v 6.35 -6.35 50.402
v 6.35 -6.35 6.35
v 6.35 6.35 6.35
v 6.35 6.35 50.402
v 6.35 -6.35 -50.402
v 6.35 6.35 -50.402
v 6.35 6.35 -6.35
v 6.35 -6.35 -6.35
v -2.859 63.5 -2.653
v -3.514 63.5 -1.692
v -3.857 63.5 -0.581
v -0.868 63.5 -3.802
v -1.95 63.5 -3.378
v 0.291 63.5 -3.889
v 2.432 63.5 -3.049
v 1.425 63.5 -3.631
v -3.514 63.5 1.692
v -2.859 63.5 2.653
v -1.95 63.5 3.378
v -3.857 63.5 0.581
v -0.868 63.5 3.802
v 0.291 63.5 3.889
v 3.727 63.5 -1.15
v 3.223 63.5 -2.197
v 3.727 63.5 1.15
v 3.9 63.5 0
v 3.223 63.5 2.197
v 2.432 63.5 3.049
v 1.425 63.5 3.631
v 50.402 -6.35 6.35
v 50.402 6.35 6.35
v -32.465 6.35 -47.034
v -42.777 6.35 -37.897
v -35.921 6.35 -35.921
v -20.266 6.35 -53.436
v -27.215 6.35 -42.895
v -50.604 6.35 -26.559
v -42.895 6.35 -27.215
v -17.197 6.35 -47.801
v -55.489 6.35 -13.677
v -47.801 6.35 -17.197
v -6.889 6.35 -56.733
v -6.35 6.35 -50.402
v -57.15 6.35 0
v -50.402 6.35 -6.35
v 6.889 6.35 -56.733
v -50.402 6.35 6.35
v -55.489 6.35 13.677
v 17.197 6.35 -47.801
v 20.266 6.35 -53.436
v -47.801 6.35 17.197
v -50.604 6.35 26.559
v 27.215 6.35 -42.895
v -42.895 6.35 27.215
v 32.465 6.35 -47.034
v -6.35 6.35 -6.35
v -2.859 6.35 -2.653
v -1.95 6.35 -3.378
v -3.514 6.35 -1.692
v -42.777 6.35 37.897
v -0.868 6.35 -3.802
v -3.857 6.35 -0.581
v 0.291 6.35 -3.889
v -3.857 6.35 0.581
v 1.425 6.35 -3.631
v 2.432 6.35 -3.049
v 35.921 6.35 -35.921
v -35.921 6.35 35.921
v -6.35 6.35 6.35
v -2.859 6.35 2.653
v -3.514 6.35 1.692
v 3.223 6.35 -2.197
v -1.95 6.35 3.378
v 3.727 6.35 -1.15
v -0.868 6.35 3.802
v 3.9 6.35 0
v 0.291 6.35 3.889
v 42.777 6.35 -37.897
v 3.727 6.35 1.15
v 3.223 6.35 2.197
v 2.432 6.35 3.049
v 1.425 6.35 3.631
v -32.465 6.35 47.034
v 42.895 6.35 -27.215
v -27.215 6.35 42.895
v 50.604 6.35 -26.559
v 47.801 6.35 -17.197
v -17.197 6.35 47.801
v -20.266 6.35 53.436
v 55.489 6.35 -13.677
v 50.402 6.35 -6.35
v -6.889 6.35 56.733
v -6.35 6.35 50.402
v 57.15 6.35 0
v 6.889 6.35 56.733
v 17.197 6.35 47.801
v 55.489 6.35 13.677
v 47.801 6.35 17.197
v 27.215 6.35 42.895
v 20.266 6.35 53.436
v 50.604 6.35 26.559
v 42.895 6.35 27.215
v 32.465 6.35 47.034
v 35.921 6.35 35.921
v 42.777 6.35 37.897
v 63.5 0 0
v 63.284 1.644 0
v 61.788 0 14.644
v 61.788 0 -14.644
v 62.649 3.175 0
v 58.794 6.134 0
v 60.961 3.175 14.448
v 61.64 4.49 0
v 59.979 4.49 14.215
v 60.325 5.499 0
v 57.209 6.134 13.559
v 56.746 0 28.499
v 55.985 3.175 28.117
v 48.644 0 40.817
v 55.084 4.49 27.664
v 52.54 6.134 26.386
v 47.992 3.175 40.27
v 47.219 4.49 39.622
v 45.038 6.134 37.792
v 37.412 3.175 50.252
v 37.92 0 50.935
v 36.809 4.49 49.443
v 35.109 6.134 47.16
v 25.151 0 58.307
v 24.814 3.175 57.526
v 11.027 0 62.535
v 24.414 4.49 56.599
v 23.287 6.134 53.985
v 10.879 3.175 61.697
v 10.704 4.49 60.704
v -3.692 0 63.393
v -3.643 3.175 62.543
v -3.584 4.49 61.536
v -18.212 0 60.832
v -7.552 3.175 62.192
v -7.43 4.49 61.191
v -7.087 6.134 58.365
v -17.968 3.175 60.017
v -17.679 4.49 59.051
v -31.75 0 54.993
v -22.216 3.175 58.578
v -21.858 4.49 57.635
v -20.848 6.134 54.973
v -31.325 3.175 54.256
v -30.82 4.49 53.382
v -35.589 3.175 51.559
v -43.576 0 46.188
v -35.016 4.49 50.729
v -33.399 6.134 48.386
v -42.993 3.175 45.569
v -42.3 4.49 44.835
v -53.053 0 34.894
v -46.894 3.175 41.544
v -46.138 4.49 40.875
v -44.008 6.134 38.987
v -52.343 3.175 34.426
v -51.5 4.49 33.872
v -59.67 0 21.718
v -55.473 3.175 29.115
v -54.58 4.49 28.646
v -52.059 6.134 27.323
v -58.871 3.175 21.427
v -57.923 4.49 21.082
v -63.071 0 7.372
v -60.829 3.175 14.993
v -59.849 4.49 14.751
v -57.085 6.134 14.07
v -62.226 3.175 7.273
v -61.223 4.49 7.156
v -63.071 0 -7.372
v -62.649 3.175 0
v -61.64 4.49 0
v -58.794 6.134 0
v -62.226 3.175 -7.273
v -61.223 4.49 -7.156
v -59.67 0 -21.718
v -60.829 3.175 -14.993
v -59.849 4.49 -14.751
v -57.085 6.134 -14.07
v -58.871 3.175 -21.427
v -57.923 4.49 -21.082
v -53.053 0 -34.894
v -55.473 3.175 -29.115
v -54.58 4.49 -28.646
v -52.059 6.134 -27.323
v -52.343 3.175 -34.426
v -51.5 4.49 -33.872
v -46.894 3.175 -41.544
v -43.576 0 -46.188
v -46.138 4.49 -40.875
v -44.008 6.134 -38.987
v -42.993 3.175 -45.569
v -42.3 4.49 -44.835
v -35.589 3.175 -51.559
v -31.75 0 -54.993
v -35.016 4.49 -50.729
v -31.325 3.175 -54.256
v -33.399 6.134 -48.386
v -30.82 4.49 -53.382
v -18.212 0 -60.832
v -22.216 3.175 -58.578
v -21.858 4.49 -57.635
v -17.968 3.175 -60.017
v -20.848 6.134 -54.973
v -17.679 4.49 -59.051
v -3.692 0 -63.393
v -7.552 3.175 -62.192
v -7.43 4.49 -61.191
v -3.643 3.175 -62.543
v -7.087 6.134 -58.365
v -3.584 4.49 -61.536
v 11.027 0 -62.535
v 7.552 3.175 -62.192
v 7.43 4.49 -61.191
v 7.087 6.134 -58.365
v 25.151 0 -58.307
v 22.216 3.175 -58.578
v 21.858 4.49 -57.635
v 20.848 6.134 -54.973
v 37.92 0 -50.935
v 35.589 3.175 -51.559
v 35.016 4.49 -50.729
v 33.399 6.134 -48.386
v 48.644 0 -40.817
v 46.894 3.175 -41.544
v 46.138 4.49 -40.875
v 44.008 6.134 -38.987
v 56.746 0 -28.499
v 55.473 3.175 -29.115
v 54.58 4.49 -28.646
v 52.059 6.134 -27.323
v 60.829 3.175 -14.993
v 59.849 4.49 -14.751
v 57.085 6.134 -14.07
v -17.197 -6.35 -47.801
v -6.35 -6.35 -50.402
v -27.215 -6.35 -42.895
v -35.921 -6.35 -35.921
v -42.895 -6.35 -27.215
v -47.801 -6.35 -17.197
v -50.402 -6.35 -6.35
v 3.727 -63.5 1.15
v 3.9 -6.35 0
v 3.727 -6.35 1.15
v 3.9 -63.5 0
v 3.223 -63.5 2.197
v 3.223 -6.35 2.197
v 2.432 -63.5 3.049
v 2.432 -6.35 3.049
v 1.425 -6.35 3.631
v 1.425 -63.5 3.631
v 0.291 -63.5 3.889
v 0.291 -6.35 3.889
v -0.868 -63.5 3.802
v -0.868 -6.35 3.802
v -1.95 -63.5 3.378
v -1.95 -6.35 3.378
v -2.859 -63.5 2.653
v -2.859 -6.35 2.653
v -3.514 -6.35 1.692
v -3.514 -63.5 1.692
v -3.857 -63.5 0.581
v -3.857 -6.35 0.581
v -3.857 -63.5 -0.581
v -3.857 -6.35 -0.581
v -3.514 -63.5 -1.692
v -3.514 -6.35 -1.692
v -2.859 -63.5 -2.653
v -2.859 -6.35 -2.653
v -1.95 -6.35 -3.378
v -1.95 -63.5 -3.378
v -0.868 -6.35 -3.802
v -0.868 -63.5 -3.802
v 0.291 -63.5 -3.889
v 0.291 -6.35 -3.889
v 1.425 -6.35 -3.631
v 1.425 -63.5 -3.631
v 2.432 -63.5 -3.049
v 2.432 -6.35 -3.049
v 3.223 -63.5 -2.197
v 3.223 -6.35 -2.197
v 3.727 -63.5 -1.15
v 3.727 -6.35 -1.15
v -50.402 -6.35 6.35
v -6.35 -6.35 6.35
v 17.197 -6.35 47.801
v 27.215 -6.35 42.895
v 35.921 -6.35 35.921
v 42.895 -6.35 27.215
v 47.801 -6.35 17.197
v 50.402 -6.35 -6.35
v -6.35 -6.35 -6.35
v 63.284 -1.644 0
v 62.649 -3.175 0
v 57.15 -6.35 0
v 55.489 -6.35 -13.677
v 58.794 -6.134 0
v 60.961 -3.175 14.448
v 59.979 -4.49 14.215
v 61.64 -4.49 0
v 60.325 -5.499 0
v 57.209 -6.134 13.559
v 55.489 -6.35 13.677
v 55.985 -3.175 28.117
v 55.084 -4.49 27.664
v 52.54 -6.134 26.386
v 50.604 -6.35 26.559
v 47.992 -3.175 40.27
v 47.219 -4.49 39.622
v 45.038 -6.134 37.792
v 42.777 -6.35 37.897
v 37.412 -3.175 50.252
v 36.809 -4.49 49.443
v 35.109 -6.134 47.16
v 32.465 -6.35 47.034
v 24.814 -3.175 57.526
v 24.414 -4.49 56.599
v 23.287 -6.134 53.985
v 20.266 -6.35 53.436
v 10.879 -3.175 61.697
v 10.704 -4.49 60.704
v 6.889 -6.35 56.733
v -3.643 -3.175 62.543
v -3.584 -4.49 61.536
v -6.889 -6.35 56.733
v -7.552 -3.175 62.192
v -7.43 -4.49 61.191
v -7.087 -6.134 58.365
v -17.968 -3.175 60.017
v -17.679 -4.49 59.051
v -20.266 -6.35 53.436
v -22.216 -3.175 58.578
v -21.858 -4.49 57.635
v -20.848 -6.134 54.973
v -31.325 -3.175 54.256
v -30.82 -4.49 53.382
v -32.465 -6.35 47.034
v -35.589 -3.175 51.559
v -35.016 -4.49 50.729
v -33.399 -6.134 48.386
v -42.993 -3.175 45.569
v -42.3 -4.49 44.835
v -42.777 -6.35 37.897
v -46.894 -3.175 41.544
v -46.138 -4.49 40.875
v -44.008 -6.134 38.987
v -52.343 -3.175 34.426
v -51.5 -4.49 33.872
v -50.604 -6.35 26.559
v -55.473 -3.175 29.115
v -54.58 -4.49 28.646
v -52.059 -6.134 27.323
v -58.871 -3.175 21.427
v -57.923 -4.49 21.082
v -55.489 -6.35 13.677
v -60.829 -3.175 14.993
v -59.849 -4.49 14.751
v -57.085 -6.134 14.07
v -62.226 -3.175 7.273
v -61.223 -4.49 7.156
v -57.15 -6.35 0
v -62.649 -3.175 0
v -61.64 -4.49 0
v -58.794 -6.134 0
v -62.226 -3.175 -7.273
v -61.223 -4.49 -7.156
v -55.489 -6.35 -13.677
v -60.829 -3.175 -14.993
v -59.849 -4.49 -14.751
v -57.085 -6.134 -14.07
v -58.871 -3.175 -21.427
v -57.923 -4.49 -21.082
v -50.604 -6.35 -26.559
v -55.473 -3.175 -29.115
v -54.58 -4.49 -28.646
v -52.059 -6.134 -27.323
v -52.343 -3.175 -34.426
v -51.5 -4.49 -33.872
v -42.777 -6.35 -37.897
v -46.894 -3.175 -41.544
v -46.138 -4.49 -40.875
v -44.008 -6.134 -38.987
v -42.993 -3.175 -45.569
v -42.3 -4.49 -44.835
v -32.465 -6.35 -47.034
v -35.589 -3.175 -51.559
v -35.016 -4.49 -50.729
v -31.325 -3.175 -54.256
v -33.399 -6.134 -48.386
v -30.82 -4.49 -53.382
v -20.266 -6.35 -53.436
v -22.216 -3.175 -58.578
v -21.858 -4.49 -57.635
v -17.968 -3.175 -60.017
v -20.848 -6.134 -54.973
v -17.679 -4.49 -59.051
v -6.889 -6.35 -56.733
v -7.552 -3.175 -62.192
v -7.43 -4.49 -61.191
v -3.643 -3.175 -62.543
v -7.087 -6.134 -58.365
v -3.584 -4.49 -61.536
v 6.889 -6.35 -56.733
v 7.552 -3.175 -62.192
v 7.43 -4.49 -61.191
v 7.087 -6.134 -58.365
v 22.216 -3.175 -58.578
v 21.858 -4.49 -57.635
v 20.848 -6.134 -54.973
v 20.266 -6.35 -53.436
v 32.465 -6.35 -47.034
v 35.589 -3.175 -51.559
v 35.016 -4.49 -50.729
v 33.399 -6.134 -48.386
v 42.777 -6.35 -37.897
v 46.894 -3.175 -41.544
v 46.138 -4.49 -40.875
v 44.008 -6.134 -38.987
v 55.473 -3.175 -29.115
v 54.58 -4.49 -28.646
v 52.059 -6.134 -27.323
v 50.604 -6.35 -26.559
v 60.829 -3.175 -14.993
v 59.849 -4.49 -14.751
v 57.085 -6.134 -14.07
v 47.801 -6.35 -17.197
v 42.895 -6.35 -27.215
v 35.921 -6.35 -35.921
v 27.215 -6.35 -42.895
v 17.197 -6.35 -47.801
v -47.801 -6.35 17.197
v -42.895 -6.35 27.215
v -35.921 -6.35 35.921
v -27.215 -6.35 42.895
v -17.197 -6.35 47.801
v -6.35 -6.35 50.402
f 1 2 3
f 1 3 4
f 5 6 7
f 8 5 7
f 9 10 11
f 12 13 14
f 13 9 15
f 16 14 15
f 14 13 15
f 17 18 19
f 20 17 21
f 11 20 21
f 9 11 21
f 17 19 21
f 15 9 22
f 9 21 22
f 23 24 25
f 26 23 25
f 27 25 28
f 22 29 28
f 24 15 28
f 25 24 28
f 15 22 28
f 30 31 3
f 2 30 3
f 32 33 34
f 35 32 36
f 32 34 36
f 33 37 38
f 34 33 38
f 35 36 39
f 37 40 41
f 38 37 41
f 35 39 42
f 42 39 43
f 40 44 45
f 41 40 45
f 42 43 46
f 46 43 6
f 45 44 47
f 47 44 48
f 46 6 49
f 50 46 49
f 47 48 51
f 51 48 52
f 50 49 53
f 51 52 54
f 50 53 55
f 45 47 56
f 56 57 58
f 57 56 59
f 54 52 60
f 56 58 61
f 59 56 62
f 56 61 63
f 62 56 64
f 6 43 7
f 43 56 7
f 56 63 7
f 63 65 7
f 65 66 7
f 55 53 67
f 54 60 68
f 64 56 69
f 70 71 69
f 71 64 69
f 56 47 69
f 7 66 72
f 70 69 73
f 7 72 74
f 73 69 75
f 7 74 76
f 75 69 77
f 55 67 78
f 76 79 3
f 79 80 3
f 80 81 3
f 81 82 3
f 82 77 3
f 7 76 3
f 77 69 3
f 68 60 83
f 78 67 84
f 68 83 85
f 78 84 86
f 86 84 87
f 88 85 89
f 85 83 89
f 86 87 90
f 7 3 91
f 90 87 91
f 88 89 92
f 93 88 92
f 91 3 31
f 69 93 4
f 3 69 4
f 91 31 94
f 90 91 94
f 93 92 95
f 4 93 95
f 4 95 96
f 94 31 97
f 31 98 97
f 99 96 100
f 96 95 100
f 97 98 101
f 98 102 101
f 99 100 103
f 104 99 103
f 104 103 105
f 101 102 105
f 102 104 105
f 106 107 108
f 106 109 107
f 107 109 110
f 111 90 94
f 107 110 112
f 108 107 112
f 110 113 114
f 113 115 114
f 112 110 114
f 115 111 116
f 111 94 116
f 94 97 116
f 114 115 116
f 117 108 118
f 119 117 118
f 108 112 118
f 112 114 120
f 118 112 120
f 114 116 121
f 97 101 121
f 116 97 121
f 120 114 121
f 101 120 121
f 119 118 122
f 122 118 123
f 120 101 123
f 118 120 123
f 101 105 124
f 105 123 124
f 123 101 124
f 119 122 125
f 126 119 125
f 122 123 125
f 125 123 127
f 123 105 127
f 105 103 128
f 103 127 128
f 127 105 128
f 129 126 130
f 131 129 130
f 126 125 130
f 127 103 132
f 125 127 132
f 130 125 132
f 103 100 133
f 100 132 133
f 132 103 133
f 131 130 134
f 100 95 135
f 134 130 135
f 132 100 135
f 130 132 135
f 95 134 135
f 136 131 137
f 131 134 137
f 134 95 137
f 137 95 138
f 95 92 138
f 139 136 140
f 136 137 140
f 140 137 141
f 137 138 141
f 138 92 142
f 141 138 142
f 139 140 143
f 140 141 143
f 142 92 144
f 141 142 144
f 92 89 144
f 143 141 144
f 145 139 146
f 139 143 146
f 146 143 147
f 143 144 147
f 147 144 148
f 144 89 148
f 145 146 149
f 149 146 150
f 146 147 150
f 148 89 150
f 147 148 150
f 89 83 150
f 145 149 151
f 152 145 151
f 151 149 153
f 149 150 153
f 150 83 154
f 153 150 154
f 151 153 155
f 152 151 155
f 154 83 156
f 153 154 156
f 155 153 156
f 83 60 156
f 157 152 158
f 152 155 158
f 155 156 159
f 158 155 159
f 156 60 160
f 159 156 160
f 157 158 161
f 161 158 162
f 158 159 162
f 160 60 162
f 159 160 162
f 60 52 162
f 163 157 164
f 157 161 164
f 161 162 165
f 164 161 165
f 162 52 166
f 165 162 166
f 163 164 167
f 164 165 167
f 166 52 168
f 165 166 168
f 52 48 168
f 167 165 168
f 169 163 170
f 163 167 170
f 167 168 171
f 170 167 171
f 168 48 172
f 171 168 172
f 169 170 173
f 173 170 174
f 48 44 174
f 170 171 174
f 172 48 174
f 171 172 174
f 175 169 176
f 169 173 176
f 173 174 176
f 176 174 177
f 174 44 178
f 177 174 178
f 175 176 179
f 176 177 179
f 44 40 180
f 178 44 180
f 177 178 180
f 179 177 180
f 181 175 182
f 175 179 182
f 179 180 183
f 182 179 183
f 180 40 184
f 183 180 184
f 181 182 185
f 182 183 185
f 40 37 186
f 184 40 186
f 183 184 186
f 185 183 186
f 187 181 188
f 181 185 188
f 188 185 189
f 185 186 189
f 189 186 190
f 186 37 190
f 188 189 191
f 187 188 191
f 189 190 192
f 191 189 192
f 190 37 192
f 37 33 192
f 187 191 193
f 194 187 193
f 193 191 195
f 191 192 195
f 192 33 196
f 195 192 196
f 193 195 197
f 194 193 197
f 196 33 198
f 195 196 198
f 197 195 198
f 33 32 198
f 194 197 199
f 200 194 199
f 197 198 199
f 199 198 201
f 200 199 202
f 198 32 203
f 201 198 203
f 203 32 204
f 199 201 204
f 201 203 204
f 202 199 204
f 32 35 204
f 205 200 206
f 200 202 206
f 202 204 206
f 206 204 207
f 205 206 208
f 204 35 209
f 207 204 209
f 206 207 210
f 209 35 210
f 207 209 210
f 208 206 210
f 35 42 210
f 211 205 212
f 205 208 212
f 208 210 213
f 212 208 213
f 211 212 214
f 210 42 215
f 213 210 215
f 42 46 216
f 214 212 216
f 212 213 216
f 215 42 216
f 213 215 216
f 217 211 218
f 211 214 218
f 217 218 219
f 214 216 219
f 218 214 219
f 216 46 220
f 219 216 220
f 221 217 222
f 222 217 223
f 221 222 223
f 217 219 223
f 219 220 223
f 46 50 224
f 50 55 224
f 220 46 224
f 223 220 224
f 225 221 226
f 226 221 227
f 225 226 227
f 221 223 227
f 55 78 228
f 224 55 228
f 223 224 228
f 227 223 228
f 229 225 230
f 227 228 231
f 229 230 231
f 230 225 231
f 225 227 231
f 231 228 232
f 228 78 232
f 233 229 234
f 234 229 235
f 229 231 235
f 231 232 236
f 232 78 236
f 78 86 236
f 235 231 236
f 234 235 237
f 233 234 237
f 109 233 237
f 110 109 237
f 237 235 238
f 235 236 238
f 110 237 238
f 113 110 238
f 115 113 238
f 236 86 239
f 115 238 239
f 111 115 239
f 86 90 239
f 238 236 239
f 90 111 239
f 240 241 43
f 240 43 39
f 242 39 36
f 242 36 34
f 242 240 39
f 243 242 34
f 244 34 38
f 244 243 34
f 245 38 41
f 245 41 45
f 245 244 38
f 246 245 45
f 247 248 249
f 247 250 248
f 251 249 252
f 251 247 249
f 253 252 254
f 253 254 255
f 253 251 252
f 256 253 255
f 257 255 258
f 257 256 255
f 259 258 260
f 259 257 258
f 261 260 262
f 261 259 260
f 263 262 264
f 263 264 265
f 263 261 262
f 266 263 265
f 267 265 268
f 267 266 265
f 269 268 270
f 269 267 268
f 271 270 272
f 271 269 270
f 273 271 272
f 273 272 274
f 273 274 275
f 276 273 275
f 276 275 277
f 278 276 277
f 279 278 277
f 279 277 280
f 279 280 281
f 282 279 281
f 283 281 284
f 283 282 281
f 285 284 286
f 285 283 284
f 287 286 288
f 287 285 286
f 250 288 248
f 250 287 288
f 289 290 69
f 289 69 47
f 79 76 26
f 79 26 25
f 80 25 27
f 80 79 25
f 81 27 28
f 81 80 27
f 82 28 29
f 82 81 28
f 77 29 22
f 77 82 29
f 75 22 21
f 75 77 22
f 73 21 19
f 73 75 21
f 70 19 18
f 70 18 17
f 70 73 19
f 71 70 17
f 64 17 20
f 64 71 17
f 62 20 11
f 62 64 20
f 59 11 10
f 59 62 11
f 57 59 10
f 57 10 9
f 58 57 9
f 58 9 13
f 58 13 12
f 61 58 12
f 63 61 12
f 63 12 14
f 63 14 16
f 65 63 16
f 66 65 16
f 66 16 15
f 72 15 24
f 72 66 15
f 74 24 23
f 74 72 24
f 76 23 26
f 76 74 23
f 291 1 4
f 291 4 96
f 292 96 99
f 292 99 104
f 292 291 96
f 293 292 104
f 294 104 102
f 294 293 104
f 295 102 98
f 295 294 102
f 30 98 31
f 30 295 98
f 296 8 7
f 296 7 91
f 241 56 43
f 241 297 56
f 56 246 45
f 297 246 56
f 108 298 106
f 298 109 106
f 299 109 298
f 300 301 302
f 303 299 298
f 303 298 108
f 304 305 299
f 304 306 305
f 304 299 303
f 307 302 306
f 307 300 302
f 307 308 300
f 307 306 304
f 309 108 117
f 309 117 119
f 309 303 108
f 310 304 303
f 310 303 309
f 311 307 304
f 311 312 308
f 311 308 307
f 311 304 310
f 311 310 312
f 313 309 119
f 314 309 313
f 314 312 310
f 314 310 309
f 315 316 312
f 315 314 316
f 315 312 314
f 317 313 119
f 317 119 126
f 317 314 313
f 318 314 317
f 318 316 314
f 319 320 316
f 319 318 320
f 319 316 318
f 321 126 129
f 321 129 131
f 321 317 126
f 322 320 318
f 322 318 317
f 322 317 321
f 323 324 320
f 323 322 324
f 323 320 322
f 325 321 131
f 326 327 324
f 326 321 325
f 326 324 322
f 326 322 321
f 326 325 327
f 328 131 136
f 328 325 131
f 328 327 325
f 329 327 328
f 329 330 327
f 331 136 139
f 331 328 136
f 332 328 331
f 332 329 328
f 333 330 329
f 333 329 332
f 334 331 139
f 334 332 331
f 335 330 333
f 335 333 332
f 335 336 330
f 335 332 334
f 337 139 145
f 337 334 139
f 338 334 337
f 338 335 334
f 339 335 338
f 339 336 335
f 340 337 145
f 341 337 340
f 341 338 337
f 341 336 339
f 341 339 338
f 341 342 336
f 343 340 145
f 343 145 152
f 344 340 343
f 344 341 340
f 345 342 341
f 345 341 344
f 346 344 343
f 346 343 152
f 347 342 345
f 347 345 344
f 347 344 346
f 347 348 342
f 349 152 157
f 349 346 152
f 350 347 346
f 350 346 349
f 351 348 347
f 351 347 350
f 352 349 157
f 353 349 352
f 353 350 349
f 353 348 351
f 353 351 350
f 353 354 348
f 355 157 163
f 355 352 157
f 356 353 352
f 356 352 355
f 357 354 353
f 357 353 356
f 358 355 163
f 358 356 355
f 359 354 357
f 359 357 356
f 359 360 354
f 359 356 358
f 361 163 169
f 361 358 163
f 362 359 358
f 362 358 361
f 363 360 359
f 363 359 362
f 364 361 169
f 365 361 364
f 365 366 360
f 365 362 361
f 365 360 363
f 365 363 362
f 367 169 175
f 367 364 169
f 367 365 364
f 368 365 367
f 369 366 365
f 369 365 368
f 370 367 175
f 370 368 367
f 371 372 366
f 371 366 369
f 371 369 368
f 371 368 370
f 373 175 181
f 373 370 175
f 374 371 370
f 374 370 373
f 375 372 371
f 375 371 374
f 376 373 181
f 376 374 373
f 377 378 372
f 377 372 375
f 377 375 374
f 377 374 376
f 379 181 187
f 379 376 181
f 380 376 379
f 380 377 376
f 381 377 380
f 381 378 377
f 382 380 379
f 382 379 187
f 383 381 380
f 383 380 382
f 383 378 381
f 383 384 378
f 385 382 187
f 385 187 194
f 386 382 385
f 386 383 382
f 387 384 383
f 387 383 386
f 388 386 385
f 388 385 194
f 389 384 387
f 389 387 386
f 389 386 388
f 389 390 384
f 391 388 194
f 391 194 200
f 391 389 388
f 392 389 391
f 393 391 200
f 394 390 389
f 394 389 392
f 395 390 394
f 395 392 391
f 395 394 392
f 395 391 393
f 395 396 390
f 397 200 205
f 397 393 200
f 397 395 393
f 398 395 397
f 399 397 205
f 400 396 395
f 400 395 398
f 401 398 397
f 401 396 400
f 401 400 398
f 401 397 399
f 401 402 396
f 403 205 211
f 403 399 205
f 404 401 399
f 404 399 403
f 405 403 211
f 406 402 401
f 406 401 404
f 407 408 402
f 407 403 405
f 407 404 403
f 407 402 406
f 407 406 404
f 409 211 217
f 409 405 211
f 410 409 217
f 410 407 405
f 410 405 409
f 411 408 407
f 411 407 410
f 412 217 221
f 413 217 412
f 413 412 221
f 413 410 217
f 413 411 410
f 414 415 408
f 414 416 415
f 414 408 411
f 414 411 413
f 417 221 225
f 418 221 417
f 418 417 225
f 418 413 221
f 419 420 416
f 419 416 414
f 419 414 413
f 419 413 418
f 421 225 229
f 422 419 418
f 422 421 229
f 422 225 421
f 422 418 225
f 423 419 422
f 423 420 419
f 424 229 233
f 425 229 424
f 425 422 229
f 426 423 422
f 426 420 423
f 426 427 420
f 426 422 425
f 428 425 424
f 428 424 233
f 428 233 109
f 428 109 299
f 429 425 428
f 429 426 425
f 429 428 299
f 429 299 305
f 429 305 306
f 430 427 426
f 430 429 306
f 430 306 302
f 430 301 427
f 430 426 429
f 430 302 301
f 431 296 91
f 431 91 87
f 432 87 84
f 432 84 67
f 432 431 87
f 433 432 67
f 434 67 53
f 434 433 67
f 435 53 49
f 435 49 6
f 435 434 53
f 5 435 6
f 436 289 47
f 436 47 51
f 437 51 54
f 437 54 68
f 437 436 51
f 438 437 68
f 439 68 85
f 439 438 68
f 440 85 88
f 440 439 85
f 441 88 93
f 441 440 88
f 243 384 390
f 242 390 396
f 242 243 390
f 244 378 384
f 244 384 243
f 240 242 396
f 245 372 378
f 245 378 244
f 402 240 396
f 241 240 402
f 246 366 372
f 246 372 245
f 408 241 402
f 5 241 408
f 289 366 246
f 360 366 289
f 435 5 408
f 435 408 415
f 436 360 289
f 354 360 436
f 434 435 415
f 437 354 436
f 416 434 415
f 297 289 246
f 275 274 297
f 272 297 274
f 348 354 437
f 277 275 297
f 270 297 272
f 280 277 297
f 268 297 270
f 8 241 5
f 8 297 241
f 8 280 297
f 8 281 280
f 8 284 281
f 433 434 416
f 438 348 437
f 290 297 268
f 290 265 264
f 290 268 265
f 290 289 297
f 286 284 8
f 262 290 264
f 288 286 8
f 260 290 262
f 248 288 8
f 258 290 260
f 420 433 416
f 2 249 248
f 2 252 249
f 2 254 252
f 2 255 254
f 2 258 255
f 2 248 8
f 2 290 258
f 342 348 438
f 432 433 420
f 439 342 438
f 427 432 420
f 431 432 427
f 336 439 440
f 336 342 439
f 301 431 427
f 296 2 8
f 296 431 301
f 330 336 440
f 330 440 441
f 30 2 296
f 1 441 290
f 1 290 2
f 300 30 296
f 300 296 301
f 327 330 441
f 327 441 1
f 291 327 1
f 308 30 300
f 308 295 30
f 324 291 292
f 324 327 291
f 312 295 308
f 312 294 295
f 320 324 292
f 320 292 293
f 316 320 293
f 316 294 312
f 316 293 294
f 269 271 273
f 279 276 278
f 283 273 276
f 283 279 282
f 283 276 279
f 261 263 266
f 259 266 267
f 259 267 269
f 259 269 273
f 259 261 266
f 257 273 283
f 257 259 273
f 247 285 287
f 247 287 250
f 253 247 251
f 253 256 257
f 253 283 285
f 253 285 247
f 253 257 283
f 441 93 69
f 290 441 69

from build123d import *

# Parameters (mm, degrees)
F0_R     = 63.5
F0_R_2   = 3.81
F1_DEPTH = 6.35
F2_R     = 6.34999
F3_R     = 3.9002189419
F4_DEPTH = 63.5


# Not quite as in the source:
# - a fillet or chamfer is up to 0.001 mm smaller than in the source, because OpenCascade refuses the exact size


with BuildPart() as f1:
    # F0 (on Front) → F1 (new body, symmetric)
    with BuildSketch(Plane.XZ):
        Circle(F0_R)
        with BuildLine():
            ThreePointArc((-6.35, -50.4015624758), (-35.9210244843, -35.9210244843), (-50.4015624758, -6.35))
            Line((-50.4015624758, -6.35), (-6.35, -6.35))
            Line((-6.35, -6.35), (-6.35, -50.4015624758))
        make_face(mode=Mode.SUBTRACT)
        with BuildLine():
            Line((6.35, -50.4015624758), (6.35, -6.35))
            Line((6.35, -6.35), (50.4015624758, -6.35))
            ThreePointArc((50.4015624758, -6.35), (35.9210244843, -35.9210244843), (6.35, -50.4015624758))
        make_face(mode=Mode.SUBTRACT)
        with BuildLine():
            Line((-6.3499999233, 50.4015624854), (-6.3499999233, 6.35))
            Line((-6.3499999233, 6.35), (-50.4015624758, 6.35))
            ThreePointArc((-50.4015624758, 6.35), (-35.9210244569, 35.9210245116), (-6.3499999233, 50.4015624854))
        make_face(mode=Mode.SUBTRACT)
        Circle(F0_R_2, mode=Mode.SUBTRACT)
        with BuildLine():
            Line((50.4015624854, 6.3499999233), (6.35, 6.3499999233))
            Line((6.35, 6.3499999233), (6.35, 50.4015624758))
            ThreePointArc((6.35, 50.4015624758), (35.9210245116, 35.9210244569), (50.4015624854, 6.3499999233))
        make_face(mode=Mode.SUBTRACT)
    extrude(amount=F1_DEPTH, both=True)

    # F2 (radius 6.35 in the source; OpenCascade refuses exactly that, so slightly less here)
    f2_edges = [f1.edges().sort_by_distance(p)[0] for p in [
        (-63.5, 6.35, 0),
        (63.5, 0, 0),
        (-63.5, -6.35, 0),
    ]]
    fillet(f2_edges, radius=F2_R)

    # F3 (on Front) → F4 (join, symmetric)
    with BuildSketch(Plane.XZ):
        with Locations((4.138e-07, 0)):
            Circle(F3_R)
    extrude(amount=F4_DEPTH, both=True)


solid = f1.part
